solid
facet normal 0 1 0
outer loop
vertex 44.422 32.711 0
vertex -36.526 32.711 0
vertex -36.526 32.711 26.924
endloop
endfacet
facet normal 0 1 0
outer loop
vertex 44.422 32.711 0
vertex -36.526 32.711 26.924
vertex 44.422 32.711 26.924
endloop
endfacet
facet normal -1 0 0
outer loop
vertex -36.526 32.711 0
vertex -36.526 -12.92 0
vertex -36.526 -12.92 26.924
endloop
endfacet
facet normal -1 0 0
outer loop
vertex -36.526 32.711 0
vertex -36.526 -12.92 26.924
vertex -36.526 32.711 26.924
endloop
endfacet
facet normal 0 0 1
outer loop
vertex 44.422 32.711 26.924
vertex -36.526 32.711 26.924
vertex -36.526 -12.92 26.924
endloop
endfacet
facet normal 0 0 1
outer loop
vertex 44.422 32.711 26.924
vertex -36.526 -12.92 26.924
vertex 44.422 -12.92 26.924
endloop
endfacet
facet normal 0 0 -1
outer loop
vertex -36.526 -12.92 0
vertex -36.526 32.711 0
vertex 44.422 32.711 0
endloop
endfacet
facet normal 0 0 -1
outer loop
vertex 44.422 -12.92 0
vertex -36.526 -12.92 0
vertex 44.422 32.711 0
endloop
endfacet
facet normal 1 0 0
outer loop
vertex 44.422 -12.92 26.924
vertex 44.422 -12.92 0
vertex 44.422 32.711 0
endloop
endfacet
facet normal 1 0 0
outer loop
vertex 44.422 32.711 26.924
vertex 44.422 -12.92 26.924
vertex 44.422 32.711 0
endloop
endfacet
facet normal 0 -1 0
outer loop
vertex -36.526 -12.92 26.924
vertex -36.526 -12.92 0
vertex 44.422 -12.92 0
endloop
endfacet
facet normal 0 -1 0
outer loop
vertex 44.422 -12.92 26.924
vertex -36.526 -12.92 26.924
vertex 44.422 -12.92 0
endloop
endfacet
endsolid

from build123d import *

# Parameters (mm, degrees)
F0_W     = 80.948703
F0_H     = 45.630322
F1_DEPTH = 26.924
F2_W     = 6.187161
F2_H     = 23.429776
F3_DEPTH = 25.4
F4_R     = 10.198526
F5_DEPTH = 26.924


with BuildPart() as f1:
    # F0 (on Top) → F1 (new body)
    with BuildSketch(Plane.XY):
        with Locations((3.948071, 9.895361)):
            Rectangle(F0_W, F0_H)
    extrude(amount=F1_DEPTH)

    # F2 (on Top) → F3 (join)
    with BuildSketch(Plane.XY):
        with BuildLine():
            ThreePointArc((-20.002084, 23.429776), (-23.095665, 26.523356), (-26.189245, 23.429776))
            Line((-26.189245, 23.429776), (-20.002084, 23.429776))
        make_face()
        with Locations((-23.095664, 11.714888)):
            Rectangle(F2_W, F2_H)
        with BuildLine():
            Line((-20.002084, 0), (-26.189245, 0))
            ThreePointArc((-26.189245, 0), (-23.095665, -3.093581), (-20.002084, 0))
        make_face()
    extrude(amount=F3_DEPTH)

    # F4 (on Top) → F5 (join)
    with BuildSketch(Plane.XY):
        with Locations((21.245664, 8.993065)):
            Circle(F4_R)
    extrude(amount=F5_DEPTH)


solid = f1.part
